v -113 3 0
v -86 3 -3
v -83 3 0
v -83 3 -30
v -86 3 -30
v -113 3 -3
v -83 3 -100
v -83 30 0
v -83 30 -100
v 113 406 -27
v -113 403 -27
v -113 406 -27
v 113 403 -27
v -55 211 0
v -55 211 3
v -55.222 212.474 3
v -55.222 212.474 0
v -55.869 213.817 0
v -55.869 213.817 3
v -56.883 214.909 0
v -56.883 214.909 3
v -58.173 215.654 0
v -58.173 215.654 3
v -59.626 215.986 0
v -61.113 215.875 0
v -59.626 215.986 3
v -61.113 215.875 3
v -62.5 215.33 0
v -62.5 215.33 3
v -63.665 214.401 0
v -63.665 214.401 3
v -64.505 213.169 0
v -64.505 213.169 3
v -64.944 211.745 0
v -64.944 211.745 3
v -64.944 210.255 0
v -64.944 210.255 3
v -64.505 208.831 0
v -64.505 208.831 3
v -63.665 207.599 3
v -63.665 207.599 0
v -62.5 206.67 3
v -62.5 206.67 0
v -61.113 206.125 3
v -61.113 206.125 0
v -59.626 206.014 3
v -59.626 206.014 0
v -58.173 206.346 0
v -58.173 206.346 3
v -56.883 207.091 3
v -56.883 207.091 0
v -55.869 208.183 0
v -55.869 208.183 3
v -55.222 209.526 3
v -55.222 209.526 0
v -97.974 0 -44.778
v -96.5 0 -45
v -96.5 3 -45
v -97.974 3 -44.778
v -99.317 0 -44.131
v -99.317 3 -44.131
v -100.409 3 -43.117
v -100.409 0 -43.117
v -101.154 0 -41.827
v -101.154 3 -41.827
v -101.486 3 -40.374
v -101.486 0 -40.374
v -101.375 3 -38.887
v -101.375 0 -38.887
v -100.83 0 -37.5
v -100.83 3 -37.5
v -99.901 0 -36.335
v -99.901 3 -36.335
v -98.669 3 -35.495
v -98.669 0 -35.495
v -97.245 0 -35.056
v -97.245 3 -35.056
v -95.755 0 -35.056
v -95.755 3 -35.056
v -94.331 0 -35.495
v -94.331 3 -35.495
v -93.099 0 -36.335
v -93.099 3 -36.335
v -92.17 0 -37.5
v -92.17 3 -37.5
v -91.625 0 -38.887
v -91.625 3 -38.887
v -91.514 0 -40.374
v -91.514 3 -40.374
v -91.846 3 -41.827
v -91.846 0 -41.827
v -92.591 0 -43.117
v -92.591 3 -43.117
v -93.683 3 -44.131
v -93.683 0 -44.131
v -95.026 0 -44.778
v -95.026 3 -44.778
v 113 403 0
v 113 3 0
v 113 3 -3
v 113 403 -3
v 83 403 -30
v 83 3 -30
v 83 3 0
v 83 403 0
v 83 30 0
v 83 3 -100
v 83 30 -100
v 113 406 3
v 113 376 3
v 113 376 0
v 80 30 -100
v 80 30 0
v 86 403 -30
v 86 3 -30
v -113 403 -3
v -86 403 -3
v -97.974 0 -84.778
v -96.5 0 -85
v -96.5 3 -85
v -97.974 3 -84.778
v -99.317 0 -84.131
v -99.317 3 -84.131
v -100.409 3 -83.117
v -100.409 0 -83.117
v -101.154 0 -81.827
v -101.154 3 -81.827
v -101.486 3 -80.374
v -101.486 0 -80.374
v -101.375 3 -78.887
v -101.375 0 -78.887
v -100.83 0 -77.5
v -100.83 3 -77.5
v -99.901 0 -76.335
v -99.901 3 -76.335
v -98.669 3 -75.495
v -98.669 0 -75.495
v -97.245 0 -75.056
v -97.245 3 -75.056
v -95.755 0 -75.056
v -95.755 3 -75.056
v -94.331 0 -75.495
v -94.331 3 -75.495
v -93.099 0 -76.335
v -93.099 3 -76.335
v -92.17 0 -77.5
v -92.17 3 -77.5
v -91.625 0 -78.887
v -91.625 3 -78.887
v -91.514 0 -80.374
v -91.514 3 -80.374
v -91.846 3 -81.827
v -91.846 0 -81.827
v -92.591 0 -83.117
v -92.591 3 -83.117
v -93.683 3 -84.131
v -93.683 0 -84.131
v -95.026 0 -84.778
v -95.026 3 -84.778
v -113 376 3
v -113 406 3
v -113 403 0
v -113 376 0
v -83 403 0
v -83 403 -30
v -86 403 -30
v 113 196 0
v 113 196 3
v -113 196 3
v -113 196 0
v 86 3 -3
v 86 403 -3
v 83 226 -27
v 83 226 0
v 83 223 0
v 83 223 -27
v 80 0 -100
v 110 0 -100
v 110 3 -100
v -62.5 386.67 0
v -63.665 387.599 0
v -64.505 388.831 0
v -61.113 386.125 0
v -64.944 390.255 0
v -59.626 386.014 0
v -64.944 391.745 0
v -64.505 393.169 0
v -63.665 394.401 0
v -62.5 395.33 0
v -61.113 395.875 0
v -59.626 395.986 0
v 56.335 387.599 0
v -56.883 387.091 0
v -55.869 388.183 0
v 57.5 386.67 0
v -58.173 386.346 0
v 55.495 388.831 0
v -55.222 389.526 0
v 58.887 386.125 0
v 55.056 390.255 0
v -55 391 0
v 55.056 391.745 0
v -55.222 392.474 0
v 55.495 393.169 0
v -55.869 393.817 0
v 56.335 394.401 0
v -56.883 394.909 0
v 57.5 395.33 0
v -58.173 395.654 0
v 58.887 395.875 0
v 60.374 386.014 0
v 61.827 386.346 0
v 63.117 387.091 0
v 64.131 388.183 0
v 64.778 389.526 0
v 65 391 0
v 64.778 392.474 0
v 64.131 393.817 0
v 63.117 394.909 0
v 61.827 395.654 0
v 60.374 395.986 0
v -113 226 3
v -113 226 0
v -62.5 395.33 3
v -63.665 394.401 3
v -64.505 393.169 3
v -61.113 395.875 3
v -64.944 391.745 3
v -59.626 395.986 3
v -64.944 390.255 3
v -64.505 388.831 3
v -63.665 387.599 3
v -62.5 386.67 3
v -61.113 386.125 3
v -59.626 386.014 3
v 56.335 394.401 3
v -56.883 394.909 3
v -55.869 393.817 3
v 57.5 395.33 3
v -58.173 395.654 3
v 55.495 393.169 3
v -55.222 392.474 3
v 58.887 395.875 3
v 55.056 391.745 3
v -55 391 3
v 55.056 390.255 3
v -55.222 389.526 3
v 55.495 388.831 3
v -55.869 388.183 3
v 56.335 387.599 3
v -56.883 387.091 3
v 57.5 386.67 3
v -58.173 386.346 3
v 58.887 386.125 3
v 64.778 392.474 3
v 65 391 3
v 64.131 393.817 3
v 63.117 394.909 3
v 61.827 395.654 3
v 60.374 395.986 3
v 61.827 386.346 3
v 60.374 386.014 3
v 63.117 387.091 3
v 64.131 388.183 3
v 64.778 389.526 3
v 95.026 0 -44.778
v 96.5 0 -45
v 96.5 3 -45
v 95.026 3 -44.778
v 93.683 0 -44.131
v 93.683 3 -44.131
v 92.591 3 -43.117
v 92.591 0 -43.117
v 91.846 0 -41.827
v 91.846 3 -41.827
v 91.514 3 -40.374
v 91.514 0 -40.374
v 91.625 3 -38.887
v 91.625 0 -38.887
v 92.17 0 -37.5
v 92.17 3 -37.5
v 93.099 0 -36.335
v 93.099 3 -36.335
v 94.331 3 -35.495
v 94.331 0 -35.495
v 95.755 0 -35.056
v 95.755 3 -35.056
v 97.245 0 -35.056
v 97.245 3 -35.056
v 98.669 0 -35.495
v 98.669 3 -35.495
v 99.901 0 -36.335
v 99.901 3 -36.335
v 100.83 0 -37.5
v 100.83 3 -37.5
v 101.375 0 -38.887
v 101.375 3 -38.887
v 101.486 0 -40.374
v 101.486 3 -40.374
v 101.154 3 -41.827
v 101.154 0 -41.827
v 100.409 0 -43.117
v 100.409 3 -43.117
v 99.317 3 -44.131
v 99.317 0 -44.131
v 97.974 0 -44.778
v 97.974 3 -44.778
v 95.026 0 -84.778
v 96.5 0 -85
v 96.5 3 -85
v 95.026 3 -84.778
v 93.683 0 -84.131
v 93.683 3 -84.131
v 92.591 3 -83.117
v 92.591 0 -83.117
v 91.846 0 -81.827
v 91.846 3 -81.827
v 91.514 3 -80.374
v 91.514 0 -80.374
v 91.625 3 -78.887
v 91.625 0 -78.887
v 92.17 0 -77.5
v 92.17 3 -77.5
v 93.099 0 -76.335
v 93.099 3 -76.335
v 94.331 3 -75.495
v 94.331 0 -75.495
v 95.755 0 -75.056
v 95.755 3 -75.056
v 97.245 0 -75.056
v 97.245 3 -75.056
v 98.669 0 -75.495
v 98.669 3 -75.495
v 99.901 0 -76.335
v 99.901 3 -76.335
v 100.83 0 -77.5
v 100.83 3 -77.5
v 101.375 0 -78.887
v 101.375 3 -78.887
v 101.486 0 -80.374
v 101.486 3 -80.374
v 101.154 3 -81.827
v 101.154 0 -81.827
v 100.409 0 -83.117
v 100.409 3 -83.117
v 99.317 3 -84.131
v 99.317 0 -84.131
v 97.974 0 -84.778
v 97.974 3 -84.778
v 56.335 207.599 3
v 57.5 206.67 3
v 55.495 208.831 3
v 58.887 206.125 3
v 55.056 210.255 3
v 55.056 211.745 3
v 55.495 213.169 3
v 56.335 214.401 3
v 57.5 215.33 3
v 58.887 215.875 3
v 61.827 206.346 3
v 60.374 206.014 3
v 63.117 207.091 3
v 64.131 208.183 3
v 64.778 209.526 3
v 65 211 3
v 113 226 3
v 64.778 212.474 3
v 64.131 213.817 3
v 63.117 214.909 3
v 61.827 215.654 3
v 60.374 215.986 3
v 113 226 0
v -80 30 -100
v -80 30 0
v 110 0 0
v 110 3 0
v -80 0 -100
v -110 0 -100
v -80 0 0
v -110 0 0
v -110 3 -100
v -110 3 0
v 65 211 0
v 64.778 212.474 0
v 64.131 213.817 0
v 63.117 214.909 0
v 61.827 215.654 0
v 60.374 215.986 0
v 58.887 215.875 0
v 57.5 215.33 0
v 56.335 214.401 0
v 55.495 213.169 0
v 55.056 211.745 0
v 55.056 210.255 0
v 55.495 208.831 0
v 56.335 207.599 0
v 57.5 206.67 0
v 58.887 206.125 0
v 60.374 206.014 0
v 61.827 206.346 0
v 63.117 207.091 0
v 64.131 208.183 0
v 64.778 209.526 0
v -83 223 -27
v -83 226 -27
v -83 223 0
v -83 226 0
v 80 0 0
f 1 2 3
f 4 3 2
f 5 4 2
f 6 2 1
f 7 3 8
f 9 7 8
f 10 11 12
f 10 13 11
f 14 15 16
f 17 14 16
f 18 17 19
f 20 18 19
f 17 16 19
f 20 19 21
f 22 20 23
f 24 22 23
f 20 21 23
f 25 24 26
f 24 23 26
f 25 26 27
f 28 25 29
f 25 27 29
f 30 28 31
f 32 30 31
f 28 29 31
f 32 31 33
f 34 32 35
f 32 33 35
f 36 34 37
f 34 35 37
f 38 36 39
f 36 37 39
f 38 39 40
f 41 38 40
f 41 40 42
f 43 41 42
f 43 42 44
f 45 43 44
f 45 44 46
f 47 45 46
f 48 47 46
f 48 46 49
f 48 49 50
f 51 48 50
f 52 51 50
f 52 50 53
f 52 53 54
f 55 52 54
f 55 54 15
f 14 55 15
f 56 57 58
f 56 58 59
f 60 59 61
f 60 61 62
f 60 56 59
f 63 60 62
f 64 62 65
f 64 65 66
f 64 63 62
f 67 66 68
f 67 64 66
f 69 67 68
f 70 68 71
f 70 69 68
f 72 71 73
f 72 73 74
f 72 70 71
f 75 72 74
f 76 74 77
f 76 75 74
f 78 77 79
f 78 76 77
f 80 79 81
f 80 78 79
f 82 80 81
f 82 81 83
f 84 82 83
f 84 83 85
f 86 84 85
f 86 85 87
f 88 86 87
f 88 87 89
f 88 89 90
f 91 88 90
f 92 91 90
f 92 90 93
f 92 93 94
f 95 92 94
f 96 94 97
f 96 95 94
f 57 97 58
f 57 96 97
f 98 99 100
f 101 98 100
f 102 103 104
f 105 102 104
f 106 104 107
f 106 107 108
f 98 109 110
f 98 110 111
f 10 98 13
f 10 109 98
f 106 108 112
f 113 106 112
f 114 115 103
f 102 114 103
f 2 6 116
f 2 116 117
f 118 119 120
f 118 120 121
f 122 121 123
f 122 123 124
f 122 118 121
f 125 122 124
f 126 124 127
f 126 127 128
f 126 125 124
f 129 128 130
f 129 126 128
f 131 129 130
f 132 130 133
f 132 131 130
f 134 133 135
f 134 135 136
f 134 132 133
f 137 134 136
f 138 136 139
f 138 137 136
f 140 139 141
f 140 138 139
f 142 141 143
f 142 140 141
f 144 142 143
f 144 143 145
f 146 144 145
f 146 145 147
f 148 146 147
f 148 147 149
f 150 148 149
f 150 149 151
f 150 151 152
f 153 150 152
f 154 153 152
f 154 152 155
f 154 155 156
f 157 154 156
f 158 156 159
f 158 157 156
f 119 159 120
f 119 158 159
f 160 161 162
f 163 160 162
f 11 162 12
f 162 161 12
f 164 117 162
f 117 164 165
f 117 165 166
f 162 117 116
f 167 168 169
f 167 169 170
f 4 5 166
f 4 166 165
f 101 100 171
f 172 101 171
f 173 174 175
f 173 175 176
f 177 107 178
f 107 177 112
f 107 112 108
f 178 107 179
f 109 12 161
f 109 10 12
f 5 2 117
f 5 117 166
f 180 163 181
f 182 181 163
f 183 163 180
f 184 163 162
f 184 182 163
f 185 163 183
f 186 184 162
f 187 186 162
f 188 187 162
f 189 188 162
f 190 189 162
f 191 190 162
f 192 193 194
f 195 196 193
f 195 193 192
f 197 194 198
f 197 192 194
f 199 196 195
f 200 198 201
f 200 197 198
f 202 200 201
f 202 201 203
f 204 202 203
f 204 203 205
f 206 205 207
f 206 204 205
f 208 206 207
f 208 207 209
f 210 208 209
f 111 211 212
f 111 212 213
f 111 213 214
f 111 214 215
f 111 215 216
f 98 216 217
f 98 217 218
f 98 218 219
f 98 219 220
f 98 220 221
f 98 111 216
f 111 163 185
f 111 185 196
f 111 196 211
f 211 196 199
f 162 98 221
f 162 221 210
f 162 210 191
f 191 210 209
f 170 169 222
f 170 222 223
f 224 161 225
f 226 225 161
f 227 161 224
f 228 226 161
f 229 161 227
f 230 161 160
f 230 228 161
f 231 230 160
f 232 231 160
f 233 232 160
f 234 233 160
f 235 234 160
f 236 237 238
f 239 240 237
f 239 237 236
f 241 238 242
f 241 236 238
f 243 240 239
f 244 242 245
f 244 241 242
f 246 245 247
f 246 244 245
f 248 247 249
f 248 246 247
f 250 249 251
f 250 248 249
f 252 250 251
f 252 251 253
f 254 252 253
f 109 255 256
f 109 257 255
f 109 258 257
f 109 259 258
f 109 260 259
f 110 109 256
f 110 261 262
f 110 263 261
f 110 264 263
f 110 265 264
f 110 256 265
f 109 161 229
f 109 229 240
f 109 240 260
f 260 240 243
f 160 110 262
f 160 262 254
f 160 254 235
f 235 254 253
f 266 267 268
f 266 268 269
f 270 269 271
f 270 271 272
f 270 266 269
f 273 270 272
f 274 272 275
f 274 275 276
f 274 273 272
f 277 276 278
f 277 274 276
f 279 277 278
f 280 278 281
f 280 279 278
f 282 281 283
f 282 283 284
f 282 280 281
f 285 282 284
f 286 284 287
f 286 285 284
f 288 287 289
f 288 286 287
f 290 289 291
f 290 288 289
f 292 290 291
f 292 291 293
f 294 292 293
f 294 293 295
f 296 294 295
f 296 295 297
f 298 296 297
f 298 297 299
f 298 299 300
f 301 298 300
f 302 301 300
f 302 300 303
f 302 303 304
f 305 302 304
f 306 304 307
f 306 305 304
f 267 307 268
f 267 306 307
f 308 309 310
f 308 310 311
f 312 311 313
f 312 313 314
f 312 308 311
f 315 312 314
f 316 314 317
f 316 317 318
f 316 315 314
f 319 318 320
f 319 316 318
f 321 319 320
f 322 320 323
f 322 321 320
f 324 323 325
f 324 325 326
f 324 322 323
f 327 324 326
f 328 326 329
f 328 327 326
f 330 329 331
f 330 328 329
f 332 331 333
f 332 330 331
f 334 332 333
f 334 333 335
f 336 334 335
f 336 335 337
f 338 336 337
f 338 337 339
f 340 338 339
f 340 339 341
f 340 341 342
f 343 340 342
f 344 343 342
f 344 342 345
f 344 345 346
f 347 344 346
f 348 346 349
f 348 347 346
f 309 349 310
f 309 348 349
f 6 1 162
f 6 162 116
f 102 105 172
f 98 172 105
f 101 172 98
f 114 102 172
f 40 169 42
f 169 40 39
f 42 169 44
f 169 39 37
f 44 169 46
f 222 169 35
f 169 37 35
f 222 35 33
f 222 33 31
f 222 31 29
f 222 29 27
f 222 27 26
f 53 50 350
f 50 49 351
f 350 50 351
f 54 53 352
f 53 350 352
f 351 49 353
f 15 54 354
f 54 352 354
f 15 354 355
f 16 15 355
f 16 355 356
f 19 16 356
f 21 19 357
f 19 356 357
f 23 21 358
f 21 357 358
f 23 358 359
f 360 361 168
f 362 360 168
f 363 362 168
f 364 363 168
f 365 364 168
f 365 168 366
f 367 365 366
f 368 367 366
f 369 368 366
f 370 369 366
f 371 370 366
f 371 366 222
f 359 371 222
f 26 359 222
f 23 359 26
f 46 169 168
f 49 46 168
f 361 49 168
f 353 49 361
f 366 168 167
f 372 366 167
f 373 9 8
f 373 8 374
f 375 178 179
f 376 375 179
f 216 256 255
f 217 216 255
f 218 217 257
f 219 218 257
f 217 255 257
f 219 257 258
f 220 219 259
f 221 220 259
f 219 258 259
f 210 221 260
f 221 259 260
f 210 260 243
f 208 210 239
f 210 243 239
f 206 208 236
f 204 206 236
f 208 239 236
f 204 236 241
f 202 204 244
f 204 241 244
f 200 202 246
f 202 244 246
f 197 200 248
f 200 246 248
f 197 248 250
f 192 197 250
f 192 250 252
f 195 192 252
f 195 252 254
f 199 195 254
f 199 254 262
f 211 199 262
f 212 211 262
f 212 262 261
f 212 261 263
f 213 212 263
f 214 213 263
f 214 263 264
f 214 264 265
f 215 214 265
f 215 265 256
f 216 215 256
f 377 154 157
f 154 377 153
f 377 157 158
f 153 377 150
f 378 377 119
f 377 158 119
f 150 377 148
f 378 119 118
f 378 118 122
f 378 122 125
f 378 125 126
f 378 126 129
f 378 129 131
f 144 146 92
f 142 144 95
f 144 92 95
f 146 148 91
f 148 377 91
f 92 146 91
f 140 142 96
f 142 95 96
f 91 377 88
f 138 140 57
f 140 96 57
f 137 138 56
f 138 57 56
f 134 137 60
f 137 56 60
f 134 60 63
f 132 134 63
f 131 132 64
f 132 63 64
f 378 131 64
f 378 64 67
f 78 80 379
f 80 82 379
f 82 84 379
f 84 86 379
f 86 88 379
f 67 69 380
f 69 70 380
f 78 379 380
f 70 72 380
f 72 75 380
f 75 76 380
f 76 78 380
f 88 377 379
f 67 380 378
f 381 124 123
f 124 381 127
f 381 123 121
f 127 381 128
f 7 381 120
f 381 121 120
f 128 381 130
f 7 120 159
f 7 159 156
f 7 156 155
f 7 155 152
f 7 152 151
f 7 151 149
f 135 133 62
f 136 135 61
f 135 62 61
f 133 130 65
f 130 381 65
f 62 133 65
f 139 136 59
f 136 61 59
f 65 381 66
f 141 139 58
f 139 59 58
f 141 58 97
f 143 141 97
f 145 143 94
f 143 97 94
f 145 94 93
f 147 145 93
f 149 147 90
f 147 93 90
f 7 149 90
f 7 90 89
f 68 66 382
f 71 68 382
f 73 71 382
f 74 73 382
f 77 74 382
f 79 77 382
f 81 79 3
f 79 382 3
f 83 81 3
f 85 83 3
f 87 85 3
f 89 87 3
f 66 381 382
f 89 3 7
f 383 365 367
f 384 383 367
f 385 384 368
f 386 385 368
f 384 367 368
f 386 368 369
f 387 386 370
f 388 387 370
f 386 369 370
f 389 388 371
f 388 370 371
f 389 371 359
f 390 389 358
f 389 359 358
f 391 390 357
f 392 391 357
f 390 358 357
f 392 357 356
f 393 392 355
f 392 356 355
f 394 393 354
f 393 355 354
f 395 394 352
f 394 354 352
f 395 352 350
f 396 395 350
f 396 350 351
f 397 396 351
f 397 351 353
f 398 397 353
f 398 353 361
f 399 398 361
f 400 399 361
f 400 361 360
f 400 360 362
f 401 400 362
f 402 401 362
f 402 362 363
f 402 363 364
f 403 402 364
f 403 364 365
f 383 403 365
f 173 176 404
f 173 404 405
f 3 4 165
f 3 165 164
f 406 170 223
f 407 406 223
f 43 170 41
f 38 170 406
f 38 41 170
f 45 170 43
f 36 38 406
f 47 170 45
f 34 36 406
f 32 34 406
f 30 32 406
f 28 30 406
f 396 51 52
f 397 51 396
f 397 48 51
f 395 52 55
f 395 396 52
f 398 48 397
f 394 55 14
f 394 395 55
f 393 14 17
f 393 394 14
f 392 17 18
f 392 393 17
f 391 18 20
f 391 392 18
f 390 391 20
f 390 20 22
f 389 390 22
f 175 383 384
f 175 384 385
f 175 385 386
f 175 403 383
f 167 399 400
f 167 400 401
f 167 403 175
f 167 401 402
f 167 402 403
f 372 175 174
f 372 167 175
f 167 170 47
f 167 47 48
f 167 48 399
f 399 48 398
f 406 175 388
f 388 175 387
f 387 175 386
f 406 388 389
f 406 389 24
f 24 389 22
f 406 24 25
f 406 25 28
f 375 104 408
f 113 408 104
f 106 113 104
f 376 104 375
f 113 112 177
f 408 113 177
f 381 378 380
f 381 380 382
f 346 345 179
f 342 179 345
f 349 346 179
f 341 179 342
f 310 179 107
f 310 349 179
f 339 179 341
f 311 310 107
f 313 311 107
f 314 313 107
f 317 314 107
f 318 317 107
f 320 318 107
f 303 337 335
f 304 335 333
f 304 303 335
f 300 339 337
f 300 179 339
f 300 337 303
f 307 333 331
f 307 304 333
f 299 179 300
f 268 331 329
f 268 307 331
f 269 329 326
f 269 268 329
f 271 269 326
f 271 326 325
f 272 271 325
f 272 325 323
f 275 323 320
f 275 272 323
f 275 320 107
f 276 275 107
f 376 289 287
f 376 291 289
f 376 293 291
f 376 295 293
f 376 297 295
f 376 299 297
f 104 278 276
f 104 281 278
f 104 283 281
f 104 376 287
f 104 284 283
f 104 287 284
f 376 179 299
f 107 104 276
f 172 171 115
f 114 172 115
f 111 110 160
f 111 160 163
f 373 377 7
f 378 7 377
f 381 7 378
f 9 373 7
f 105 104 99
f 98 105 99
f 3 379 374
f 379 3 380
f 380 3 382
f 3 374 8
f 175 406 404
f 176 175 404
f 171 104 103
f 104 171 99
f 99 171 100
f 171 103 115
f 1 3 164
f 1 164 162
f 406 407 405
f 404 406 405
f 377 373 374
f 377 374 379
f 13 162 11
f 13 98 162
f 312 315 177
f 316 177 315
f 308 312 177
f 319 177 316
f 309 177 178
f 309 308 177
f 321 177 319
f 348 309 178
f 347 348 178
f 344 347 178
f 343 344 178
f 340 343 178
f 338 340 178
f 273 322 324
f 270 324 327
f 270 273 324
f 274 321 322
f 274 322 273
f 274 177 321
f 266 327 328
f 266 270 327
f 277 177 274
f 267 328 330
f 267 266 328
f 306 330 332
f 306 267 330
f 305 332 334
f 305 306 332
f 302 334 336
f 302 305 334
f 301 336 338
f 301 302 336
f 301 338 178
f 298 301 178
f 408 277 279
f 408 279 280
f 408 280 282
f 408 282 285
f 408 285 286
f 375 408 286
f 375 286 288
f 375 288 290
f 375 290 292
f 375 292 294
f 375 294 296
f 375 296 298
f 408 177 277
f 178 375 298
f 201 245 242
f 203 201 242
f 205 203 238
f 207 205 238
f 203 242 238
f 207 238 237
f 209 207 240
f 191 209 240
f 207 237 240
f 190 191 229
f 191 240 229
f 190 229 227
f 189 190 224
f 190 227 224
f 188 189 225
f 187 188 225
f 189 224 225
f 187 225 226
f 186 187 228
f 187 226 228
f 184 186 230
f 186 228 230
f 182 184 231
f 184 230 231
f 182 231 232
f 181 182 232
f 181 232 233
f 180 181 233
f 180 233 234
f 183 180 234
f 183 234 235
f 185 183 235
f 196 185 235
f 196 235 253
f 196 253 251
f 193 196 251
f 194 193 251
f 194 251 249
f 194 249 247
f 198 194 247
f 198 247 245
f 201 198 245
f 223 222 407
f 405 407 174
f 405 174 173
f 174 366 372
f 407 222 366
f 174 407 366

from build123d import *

# Parameters (mm, degrees)
BOSS_EXTRUDE1_DEPTH   = 100
BOSS_EXTRUDE1_2_DEPTH = 100
BOSS_EXTRUDE2_START   = 3
BOSS_EXTRUDE2_DEPTH   = 400
BOSS_EXTRUDE2_2_DEPTH = 400
BOSS_EXTRUDE3_DEPTH   = 113
SKETCH4_W             = 3
SKETCH4_H             = 30
BOSS_EXTRUDE4_DEPTH   = 113
SKETCH5_W             = 30
SKETCH5_H             = 3
BOSS_EXTRUDE5_DEPTH   = 83
SKETCH6_R             = 5
CUT_EXTRUDE1_DEPTH    = 434.836374685
SKETCH7_R             = 5
CUT_EXTRUDE2_DEPTH    = 3


with BuildPart() as part:
    # Sketch1 → Boss-Extrude1 (new body)
    with BuildSketch(Plane.XY):
        Polygon((-80, 30), (-80, 0), (-110, 0), (-110, 3), (-83, 3), (-83, 30), align=None)
    extrude(amount=-BOSS_EXTRUDE1_DEPTH)


with BuildPart() as body_2:
    # Sketch1 → Boss-Extrude1 2 (new body)
    with BuildSketch(Plane.XY):
        Polygon((83, 30), (80, 30), (80, 0), (110, 0), (110, 3), (83, 3), align=None)
    extrude(amount=-BOSS_EXTRUDE1_2_DEPTH)


with BuildPart() as body_3:
    # Sketch2 → Boss-Extrude2 (new body)
    with BuildSketch(Plane(origin=(0, 0, 0), x_dir=(1, 0, 0), z_dir=(0, 1, 0)).offset(BOSS_EXTRUDE2_START)):
        Polygon((83, 30), (83, 0), (113, 0), (113, 3), (86, 3), (86, 30), align=None)
    extrude(amount=BOSS_EXTRUDE2_DEPTH)


with BuildPart() as body_4:
    # Sketch2 → Boss-Extrude2 2 (new body)
    with BuildSketch(Plane(origin=(0, 0, 0), x_dir=(1, 0, 0), z_dir=(0, 1, 0)).offset(BOSS_EXTRUDE2_START)):
        Polygon((-86, 30), (-83, 30), (-83, 0), (-113, 0), (-113, 3), (-86, 3), align=None)
    extrude(amount=BOSS_EXTRUDE2_2_DEPTH)


with BuildPart() as body_5:
    # Sketch3 → Boss-Extrude3 (new, symmetric)
    with BuildSketch(Plane(origin=(0, 0, 0), x_dir=(0, 0, -1), z_dir=(1, 0, 0))):
        Polygon((27, 406), (-3, 406), (-3, 376), (0, 376), (0, 403), (27, 403), align=None)
    extrude(amount=BOSS_EXTRUDE3_DEPTH, both=True)


with BuildPart() as body_6:
    # Sketch4 → Boss-Extrude4 (new, symmetric)
    with BuildSketch(Plane(origin=(0, 0, 0), x_dir=(0, 0, -1), z_dir=(1, 0, 0))):
        with Locations((-1.5, 211)):
            Rectangle(SKETCH4_W, SKETCH4_H)
    extrude(amount=BOSS_EXTRUDE4_DEPTH, both=True)

    # Sketch5 → Boss-Extrude5 (add, symmetric)
    with BuildSketch(Plane(origin=(0, 0, 0), x_dir=(0, 0, -1), z_dir=(1, 0, 0))):
        with Locations((12, 224.5)):
            Rectangle(SKETCH5_W, SKETCH5_H)
    extrude(amount=BOSS_EXTRUDE5_DEPTH, both=True)


with BuildPart() as cut_extrude1_tool:
    # Sketch6 → Cut-Extrude1 (new, through all)
    with BuildSketch(Plane.XY.offset(3)):
        with Locations((-60, 391)):
            Circle(SKETCH6_R)
        with Locations((60, 391)):
            Circle(SKETCH6_R)
        with Locations((-60, 211)):
            Circle(SKETCH6_R)
        with Locations((60, 211)):
            Circle(SKETCH6_R)
    extrude(amount=-CUT_EXTRUDE1_DEPTH)


with BuildPart() as body_5_1:
    add(body_5.part)

    # Cut-Extrude1: cut by cut_extrude1_tool
    add(cut_extrude1_tool.part, mode=Mode.SUBTRACT)


with BuildPart() as body_6_1:
    add(body_6.part)

    # Cut-Extrude1: cut by cut_extrude1_tool
    add(cut_extrude1_tool.part, mode=Mode.SUBTRACT)


with BuildPart() as cut_extrude2_tool:
    # Sketch7 → Cut-Extrude2 (new body)
    with BuildSketch(Plane(origin=(0, 0, 0), x_dir=(1, 0, 0), z_dir=(0, 1, 0))):
        with Locations(Location((-96.5, 80, 0), (0, 0, 90))):
            Circle(SKETCH7_R)
        with Locations(Location((-96.5, 40, 0), (0, 0, 90))):
            Circle(SKETCH7_R)
        with Locations(Location((96.5, 80, 0), (0, 0, 90))):
            Circle(SKETCH7_R)
        with Locations(Location((96.5, 40, 0), (0, 0, 90))):
            Circle(SKETCH7_R)
    extrude(amount=CUT_EXTRUDE2_DEPTH)


with BuildPart() as part_1:
    add(part.part)

    # Cut-Extrude2: cut by cut_extrude2_tool
    add(cut_extrude2_tool.part, mode=Mode.SUBTRACT)


with BuildPart() as body_2_1:
    add(body_2.part)

    # Cut-Extrude2: cut by cut_extrude2_tool
    add(cut_extrude2_tool.part, mode=Mode.SUBTRACT)


solid = Compound([body_3.part, body_4.part, body_5_1.part, body_6_1.part, part_1.part, body_2_1.part])
